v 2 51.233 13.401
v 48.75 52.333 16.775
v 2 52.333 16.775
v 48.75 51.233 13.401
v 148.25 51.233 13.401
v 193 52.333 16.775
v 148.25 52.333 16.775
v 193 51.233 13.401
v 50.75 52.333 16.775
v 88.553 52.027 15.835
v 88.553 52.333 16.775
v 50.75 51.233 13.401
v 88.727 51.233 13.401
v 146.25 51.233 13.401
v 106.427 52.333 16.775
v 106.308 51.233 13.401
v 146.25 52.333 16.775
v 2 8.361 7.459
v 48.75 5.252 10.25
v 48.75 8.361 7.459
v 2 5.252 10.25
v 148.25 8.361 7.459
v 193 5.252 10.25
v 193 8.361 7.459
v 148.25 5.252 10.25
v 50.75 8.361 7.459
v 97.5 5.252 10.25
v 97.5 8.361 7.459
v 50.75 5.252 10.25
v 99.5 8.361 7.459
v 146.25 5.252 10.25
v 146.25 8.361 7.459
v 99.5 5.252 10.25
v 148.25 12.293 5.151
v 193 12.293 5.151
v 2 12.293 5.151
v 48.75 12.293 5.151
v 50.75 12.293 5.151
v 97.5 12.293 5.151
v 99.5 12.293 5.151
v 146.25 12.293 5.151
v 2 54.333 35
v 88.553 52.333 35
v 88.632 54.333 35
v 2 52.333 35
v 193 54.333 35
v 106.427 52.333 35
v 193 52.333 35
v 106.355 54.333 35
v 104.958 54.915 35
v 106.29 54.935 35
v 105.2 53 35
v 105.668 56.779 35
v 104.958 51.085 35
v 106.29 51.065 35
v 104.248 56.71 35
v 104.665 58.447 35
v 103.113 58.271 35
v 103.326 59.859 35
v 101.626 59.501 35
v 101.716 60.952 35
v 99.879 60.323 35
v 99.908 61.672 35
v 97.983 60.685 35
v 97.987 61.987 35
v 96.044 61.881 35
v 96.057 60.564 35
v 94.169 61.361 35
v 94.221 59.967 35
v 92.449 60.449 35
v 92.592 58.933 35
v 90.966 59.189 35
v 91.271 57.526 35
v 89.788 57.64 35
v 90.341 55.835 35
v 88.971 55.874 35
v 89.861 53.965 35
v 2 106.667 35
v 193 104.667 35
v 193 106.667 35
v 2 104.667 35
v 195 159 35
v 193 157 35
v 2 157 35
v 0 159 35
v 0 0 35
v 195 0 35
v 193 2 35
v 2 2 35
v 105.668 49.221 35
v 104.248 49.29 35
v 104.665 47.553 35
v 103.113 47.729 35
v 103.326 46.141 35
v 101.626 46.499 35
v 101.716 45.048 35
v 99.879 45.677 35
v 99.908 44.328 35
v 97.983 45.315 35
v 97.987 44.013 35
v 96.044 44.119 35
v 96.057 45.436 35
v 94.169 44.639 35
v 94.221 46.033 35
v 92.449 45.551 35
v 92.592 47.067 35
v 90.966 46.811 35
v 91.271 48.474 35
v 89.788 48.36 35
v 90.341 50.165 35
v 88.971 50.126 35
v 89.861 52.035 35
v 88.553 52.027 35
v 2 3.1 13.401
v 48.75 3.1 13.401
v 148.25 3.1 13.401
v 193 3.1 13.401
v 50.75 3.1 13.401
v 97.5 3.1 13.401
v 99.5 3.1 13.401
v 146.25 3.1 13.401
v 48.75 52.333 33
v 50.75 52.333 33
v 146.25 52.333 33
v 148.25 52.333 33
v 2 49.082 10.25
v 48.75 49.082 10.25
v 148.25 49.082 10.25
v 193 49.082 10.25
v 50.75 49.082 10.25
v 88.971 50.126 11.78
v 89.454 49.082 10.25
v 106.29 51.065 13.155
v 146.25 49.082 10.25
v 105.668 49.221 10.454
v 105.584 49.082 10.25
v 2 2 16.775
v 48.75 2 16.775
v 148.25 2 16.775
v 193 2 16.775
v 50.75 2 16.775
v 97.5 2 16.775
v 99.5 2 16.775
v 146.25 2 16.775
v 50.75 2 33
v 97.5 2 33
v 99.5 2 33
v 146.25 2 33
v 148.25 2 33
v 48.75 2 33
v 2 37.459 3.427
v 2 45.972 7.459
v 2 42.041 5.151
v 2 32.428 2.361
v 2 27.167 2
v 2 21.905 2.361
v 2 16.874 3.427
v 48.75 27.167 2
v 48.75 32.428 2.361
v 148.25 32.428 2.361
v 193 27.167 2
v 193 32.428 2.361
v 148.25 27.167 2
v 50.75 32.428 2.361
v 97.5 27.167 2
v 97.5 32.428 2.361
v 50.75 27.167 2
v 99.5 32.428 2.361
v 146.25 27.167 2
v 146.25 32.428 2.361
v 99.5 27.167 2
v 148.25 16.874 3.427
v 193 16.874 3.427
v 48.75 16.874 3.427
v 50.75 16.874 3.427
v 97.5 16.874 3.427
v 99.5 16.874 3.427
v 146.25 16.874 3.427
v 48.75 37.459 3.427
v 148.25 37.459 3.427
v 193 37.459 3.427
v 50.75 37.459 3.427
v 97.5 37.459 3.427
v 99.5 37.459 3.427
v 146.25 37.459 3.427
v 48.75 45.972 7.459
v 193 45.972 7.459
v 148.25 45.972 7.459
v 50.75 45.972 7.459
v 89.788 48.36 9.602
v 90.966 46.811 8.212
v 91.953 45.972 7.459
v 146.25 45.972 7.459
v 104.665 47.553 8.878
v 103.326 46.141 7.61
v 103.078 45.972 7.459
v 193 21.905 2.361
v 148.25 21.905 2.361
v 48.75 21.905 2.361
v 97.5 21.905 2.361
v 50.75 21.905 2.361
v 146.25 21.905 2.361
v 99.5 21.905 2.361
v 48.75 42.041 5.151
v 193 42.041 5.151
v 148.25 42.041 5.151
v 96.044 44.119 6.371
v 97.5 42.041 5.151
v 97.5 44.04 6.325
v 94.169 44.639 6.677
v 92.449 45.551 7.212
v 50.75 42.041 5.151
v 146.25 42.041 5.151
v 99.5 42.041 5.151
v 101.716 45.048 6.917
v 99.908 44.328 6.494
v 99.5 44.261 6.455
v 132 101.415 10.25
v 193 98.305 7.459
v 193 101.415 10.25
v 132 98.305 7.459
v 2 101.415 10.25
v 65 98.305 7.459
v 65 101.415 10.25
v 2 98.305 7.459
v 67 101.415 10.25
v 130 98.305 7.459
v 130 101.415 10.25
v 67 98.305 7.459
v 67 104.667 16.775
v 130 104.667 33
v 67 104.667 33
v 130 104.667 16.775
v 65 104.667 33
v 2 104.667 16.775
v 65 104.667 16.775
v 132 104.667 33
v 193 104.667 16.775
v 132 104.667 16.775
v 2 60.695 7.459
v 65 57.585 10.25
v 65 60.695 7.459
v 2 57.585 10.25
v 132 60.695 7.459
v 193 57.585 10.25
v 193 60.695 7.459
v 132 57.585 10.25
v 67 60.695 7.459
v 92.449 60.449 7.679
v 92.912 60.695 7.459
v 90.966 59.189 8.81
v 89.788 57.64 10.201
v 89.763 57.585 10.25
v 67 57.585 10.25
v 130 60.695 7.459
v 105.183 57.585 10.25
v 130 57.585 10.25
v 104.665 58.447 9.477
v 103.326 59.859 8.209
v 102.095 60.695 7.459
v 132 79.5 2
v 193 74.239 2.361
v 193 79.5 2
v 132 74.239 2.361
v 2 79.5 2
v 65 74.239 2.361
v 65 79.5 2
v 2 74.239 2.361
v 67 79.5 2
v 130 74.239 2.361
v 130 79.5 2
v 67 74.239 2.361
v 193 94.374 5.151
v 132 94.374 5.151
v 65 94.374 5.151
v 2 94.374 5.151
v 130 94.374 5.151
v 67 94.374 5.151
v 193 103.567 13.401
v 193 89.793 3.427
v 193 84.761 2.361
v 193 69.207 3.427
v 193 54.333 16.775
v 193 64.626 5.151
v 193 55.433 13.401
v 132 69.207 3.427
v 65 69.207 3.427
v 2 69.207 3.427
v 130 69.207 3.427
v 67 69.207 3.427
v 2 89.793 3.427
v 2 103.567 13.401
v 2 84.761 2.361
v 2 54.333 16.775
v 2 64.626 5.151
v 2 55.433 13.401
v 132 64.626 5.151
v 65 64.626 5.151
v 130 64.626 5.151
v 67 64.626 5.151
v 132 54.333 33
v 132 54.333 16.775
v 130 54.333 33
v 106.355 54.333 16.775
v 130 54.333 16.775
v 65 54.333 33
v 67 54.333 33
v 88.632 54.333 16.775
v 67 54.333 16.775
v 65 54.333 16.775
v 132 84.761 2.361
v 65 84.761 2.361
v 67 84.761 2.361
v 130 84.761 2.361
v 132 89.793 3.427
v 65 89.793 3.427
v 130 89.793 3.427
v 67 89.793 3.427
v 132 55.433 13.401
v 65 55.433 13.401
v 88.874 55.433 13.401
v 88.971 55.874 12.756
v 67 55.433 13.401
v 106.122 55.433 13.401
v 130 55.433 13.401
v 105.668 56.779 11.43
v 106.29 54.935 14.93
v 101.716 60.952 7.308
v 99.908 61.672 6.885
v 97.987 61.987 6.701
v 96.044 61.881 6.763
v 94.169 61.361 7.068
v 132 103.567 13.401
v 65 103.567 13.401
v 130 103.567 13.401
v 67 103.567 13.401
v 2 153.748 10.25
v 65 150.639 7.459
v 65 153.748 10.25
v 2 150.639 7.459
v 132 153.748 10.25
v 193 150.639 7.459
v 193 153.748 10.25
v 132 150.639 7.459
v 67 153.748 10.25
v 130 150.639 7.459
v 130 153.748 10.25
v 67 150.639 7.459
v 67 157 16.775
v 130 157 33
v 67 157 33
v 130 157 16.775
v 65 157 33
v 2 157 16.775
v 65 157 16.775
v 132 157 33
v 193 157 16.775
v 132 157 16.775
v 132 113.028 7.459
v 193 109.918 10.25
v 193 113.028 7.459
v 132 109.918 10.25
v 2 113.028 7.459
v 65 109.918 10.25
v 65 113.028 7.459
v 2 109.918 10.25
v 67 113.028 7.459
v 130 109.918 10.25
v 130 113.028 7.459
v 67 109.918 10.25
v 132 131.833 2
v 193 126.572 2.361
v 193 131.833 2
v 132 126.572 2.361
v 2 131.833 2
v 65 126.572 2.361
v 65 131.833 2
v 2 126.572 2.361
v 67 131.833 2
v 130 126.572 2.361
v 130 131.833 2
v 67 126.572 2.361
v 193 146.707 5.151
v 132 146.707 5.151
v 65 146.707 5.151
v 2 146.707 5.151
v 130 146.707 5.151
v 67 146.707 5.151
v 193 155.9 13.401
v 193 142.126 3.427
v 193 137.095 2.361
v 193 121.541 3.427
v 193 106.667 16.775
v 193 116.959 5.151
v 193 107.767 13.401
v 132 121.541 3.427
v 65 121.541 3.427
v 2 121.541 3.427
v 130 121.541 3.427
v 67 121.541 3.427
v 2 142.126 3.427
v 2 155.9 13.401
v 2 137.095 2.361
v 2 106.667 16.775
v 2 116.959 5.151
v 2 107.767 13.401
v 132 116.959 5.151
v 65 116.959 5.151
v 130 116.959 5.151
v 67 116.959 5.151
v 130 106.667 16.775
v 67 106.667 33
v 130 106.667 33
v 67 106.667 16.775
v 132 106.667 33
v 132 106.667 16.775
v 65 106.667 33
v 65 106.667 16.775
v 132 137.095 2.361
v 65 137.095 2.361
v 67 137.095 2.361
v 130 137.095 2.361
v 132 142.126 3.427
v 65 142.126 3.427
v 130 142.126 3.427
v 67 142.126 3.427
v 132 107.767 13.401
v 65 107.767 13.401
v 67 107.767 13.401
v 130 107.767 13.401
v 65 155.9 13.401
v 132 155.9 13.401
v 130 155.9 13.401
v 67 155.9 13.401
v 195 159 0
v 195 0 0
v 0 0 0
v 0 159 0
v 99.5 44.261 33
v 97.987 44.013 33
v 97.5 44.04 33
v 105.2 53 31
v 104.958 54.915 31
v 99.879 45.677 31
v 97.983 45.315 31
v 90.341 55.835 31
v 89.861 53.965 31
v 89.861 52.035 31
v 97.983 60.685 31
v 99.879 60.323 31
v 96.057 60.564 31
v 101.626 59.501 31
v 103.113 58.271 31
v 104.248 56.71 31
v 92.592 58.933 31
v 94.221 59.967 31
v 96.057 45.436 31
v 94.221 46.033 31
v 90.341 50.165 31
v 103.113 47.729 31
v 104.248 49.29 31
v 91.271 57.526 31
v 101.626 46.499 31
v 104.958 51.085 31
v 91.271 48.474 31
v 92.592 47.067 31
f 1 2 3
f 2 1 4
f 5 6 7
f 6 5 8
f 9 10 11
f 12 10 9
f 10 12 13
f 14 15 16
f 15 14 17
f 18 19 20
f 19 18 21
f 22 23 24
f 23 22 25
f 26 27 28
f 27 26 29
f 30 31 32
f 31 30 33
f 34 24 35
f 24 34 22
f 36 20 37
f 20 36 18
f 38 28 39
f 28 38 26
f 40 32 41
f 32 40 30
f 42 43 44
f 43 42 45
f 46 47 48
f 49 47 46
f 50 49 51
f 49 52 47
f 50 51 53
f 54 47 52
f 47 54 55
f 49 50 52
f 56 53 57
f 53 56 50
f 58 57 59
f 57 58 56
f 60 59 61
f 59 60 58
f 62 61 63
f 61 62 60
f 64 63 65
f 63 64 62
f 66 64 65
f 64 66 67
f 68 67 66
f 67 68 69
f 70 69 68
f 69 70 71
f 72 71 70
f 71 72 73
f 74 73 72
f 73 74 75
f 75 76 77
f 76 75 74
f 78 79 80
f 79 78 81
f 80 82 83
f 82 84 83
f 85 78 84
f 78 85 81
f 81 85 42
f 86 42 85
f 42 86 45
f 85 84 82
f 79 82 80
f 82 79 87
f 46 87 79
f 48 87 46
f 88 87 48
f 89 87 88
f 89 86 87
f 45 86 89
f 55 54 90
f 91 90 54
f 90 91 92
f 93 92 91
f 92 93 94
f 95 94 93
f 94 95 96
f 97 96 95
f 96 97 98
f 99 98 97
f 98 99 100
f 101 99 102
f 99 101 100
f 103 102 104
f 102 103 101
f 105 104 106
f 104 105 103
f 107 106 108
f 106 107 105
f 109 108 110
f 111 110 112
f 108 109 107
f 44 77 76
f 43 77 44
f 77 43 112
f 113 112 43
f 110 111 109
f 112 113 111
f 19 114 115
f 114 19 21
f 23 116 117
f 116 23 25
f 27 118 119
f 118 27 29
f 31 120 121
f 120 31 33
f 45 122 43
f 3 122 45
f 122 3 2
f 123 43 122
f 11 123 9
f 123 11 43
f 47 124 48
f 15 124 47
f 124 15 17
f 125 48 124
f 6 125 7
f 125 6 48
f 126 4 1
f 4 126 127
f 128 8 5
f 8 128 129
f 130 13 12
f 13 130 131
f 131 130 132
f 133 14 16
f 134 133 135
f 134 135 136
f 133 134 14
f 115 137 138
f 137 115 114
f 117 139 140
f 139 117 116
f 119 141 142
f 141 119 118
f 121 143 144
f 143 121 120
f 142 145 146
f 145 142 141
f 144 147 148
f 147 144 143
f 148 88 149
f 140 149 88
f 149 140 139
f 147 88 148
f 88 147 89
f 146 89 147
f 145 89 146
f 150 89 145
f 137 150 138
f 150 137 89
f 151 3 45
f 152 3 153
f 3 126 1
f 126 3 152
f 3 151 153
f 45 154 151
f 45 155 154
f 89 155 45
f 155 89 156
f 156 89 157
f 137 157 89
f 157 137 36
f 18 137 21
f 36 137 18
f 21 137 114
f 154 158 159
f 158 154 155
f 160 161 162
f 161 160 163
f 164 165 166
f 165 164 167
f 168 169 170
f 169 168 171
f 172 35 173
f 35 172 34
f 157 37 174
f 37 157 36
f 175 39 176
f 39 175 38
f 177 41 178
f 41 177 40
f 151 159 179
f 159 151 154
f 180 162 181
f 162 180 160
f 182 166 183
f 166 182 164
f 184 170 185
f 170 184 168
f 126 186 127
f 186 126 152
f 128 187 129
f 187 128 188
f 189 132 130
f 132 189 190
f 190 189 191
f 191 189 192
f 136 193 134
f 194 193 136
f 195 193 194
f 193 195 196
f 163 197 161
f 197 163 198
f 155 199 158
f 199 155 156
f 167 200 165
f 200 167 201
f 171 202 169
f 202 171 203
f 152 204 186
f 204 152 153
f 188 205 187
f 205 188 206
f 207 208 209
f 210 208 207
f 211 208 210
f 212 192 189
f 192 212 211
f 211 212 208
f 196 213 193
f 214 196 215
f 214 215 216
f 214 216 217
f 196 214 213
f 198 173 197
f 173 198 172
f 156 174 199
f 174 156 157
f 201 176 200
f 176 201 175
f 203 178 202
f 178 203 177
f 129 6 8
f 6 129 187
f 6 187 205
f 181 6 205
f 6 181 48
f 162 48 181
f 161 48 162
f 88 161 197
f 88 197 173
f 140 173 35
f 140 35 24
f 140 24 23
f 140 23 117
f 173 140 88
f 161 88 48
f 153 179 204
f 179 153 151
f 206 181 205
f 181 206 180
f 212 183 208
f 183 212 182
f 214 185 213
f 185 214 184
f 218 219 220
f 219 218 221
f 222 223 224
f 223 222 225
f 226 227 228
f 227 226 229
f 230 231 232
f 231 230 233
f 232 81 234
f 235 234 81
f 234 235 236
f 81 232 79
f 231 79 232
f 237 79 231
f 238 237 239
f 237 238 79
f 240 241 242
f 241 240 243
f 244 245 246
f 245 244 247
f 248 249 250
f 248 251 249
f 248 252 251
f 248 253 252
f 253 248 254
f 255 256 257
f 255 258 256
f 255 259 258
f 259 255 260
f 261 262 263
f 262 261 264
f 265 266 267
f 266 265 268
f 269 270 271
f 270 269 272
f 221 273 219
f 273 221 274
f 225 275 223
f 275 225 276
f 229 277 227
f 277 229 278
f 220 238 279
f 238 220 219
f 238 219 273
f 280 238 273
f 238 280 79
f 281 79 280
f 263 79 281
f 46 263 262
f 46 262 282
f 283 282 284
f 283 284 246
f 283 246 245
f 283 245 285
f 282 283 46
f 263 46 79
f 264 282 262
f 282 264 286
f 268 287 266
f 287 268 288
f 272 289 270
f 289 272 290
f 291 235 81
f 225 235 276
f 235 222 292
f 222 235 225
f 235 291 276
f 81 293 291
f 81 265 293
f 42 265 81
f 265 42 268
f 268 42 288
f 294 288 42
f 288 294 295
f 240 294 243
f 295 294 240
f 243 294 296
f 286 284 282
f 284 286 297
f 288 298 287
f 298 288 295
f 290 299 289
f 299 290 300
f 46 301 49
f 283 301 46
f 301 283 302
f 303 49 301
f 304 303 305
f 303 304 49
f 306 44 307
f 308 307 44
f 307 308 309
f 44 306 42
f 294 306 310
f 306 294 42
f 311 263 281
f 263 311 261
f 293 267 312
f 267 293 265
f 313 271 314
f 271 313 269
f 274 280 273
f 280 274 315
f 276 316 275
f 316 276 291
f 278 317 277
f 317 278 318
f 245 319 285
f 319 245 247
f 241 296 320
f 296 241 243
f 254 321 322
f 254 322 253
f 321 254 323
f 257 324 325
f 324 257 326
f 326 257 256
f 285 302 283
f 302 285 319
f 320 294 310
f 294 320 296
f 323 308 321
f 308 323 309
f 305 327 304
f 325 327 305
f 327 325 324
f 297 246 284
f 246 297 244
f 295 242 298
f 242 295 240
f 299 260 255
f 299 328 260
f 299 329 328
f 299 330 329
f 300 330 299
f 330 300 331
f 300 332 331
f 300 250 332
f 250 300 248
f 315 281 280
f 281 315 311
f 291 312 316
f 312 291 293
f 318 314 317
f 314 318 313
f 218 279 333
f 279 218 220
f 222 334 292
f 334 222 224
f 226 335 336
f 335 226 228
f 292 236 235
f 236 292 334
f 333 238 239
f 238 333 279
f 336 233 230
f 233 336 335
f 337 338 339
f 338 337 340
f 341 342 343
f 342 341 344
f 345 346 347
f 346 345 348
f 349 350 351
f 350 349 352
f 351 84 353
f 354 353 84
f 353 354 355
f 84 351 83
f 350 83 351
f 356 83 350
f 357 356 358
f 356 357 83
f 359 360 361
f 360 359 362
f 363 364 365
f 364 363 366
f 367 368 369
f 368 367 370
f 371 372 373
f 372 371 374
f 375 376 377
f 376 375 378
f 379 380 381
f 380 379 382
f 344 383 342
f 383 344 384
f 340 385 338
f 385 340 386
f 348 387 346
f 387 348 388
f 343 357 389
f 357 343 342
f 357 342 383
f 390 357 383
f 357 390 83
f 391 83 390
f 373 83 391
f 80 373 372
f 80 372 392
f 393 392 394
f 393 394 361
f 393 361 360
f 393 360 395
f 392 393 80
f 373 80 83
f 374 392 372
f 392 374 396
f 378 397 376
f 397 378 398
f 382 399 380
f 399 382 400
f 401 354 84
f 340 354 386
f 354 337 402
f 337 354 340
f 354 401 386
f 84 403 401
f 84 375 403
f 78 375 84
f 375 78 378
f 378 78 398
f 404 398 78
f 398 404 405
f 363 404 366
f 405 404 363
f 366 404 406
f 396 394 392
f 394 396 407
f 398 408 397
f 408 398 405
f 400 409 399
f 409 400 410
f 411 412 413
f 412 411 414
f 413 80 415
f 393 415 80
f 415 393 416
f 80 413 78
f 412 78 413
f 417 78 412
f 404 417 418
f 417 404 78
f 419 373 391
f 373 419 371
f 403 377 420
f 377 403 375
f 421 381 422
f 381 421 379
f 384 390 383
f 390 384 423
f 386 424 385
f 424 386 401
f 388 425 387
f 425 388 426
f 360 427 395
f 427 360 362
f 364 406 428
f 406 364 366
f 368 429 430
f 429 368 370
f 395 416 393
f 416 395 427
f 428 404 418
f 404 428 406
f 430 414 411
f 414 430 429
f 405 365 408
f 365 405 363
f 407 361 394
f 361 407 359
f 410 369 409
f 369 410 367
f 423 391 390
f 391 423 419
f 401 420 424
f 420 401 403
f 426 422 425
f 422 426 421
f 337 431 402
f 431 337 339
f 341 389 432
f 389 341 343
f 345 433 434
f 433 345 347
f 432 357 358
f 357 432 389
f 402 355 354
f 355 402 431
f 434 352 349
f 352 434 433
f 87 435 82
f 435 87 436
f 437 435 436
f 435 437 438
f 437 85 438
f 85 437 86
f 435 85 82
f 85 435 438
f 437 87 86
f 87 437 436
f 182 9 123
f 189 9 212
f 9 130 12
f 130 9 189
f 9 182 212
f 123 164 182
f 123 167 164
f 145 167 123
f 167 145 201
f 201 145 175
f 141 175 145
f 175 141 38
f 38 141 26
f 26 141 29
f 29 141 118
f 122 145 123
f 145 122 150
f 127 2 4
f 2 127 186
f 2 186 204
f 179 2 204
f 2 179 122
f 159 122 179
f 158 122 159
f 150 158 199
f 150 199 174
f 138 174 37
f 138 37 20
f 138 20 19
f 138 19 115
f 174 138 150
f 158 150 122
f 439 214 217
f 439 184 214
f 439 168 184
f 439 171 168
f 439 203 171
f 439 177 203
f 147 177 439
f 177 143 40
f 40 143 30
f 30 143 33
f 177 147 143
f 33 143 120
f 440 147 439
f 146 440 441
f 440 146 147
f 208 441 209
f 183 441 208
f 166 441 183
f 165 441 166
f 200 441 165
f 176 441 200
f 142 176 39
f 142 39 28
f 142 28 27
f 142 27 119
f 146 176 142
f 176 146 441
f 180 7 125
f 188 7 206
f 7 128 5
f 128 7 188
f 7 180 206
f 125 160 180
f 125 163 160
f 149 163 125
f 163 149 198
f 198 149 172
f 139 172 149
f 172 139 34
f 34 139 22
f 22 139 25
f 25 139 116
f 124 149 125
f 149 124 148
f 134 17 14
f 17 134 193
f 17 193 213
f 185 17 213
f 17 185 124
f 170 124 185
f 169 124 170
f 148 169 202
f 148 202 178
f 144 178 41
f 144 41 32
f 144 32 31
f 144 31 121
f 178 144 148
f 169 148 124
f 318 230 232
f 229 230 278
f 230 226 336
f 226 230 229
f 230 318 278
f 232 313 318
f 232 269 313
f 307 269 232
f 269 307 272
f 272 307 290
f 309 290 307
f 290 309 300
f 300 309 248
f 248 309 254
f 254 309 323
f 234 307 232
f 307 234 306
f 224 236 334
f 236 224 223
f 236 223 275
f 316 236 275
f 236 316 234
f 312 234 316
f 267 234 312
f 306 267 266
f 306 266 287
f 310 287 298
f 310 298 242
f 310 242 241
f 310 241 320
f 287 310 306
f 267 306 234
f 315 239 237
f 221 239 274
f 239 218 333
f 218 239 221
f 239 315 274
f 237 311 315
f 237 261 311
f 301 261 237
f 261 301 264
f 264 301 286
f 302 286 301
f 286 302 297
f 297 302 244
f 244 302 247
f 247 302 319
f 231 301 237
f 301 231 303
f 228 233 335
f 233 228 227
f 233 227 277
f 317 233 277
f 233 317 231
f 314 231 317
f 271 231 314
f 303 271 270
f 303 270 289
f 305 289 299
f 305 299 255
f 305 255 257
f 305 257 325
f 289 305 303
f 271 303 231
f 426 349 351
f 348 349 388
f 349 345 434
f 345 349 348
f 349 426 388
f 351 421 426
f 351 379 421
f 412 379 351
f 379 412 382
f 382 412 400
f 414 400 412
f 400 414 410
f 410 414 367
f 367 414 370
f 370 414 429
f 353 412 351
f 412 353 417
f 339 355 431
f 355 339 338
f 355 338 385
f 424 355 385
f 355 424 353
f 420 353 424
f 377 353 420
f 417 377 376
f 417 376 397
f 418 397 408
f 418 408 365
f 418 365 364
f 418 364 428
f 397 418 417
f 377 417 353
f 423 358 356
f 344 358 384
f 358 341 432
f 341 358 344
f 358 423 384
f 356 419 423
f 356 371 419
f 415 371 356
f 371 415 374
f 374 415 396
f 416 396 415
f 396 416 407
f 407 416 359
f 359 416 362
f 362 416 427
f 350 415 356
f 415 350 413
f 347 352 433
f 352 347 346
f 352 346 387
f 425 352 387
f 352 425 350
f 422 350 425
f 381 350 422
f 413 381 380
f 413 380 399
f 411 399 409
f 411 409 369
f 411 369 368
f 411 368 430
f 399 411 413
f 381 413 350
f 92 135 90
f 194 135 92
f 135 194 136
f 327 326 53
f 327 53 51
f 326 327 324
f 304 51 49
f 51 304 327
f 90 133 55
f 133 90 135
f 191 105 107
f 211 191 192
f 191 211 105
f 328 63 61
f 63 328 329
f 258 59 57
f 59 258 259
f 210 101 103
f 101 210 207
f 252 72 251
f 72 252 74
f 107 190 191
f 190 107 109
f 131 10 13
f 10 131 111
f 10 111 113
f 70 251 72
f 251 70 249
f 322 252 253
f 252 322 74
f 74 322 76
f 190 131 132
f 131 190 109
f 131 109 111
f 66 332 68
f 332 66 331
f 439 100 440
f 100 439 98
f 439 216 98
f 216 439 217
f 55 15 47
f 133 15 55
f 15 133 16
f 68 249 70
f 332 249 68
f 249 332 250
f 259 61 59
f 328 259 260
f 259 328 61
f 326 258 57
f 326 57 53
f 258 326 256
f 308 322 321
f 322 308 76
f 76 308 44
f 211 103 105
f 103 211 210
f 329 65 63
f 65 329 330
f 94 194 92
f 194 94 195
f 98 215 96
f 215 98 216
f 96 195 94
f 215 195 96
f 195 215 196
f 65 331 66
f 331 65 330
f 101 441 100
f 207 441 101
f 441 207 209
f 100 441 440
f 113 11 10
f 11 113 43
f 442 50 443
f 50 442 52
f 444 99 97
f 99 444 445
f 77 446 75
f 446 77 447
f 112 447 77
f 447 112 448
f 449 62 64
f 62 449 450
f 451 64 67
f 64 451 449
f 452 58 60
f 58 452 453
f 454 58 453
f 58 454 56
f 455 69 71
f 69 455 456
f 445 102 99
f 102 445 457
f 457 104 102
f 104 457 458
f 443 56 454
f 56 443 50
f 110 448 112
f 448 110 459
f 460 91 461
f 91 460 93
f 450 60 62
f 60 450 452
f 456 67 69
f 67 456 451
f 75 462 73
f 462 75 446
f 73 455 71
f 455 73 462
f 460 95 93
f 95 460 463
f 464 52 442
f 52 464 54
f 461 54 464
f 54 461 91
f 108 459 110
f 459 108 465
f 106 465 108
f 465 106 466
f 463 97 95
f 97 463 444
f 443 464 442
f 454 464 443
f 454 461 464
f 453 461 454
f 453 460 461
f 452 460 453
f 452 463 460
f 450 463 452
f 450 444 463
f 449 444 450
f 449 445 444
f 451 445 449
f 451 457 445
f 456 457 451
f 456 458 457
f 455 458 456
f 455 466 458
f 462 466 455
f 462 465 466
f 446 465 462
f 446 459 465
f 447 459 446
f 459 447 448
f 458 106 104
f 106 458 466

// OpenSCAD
//200 by 160 by 35

height = 35;
totalLength = 195;
totalWidth = 159;
floorThickness = 2;
width = 159;
wall = 2;
compartmentWidth = (totalWidth - wall * 4) / 3;
compartmentHeight = height - floorThickness;
compartmentLength = totalLength - wall - wall;
smallDividedLength = (compartmentLength - (wall * 2))/4;
largeDividedLength = (compartmentLength - wall)/3;
widthDividers = 2;

magnetBaseOuterDiameter = 18;
magnetBaseInnerDiameter = 15.4;
magnetHeight = 4.0;

difference(){
	union(){
		difference(){
			cube([totalLength, totalWidth, height]);
			for(index=[0:widthDividers])
			translate([wall,(index * (compartmentWidth + wall)) + wall,(floorThickness)])
			rotate([0,90,0])
			translate([-compartmentHeight/2, compartmentWidth/2,0])
			linear_extrude(height = compartmentLength, center = false){
				union(){
					resize([compartmentHeight,compartmentWidth])circle(d=20);
					translate([-compartmentHeight/2,-compartmentWidth/2,0])
					square([compartmentHeight/2, compartmentWidth]);
				};
			};
		};
		translate([totalLength/2, totalWidth/3, 0])
		cylinder(height, d=magnetBaseOuterDiameter);
		for(index=[1:3])
		translate([(smallDividedLength + wall) * index, wall, 0])
		cube([wall, compartmentWidth, compartmentHeight]);
		for(index=[1:2])
		translate([(largeDividedLength + wall) * index, wall + compartmentWidth + wall, 0])
		cube([wall, compartmentWidth, compartmentHeight]);
		for(index=[1:2])
		translate([(largeDividedLength + wall) * index, (wall + compartmentWidth) * 2 + wall, 0])
		cube([wall, compartmentWidth, compartmentHeight]);
	};
	translate([totalLength/2, totalWidth/3, height - magnetHeight])
    cylinder(magnetHeight, d=magnetBaseInnerDiameter);
};
